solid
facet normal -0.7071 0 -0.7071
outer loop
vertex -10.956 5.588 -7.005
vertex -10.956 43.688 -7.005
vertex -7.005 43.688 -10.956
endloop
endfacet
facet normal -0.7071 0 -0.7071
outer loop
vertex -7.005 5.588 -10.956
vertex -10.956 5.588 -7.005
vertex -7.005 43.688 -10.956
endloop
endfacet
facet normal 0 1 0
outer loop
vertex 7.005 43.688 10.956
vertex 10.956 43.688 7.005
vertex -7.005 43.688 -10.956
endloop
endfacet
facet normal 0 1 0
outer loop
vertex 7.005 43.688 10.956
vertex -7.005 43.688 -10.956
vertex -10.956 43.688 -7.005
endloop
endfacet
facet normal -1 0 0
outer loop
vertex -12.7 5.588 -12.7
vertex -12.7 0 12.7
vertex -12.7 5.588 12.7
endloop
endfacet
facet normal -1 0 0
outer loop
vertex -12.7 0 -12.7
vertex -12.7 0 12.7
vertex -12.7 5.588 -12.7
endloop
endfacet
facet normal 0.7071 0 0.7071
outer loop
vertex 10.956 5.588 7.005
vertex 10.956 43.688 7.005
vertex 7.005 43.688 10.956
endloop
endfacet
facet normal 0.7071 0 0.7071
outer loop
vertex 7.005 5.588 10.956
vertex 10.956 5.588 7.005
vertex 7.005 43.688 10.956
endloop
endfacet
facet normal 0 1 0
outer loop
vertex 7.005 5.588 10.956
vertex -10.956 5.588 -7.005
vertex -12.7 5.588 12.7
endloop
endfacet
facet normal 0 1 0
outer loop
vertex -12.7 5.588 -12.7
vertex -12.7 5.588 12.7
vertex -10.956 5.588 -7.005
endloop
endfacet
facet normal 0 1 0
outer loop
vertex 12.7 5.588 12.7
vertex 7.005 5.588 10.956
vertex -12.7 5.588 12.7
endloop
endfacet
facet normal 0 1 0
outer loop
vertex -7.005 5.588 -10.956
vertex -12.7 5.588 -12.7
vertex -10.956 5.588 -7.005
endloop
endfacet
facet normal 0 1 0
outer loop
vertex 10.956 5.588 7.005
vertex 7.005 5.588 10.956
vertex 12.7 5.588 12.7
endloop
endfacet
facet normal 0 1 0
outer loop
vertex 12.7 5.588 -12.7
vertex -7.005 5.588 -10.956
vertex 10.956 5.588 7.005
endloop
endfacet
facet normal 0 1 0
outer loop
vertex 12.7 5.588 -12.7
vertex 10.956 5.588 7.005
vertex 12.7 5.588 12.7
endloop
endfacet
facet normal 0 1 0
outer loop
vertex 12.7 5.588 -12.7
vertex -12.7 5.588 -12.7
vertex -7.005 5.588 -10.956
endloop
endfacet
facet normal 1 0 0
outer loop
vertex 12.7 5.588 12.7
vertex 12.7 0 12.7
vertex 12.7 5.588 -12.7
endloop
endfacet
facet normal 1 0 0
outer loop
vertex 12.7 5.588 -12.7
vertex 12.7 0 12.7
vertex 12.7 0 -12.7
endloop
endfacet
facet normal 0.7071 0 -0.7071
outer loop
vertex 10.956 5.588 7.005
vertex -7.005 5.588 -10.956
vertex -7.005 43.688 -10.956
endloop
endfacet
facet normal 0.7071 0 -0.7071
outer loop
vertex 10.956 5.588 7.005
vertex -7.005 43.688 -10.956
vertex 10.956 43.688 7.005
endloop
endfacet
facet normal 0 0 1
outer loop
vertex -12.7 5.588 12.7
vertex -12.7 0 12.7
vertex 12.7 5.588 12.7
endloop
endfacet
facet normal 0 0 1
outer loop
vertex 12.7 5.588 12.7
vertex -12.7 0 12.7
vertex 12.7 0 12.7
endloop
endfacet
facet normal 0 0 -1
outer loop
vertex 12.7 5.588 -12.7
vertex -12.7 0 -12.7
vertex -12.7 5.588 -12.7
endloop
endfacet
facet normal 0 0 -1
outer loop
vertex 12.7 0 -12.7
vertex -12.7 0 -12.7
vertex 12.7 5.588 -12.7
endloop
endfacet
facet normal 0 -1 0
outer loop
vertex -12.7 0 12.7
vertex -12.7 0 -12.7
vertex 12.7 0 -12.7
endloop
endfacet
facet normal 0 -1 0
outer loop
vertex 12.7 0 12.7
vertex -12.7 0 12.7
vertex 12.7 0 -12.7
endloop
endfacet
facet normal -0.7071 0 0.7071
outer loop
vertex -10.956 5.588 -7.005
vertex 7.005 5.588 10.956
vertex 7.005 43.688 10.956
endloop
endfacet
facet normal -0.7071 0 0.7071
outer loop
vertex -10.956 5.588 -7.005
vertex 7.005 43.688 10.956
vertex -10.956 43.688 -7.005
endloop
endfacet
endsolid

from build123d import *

# Parameters (mm, degrees)
SKETCH1_W           = 25.4
SKETCH1_H           = 25.4
BOSS_EXTRUDE1_DEPTH = 5.588
BOSS_EXTRUDE2_DEPTH = 38.1


with BuildPart() as part:
    # Sketch1 → Boss-Extrude1 (new body)
    with BuildSketch(Plane(origin=(0, 0, 0), x_dir=(1, 0, 0), z_dir=(0, 1, 0))):
        Rectangle(SKETCH1_W, SKETCH1_H)
    extrude(amount=BOSS_EXTRUDE1_DEPTH)

    # Sketch2 → Boss-Extrude2 (add)
    with BuildSketch(Plane(origin=(0, 5.588, 0), x_dir=(1, 0, 0), z_dir=(0, 1, 0))):
        Polygon((-7.004599774, 10.955912468), (10.955912468, -7.004599774), (7.004599774, -10.955912468), (-10.955912468, 7.004599774), align=None)
    extrude(amount=BOSS_EXTRUDE2_DEPTH)


solid = part.part
